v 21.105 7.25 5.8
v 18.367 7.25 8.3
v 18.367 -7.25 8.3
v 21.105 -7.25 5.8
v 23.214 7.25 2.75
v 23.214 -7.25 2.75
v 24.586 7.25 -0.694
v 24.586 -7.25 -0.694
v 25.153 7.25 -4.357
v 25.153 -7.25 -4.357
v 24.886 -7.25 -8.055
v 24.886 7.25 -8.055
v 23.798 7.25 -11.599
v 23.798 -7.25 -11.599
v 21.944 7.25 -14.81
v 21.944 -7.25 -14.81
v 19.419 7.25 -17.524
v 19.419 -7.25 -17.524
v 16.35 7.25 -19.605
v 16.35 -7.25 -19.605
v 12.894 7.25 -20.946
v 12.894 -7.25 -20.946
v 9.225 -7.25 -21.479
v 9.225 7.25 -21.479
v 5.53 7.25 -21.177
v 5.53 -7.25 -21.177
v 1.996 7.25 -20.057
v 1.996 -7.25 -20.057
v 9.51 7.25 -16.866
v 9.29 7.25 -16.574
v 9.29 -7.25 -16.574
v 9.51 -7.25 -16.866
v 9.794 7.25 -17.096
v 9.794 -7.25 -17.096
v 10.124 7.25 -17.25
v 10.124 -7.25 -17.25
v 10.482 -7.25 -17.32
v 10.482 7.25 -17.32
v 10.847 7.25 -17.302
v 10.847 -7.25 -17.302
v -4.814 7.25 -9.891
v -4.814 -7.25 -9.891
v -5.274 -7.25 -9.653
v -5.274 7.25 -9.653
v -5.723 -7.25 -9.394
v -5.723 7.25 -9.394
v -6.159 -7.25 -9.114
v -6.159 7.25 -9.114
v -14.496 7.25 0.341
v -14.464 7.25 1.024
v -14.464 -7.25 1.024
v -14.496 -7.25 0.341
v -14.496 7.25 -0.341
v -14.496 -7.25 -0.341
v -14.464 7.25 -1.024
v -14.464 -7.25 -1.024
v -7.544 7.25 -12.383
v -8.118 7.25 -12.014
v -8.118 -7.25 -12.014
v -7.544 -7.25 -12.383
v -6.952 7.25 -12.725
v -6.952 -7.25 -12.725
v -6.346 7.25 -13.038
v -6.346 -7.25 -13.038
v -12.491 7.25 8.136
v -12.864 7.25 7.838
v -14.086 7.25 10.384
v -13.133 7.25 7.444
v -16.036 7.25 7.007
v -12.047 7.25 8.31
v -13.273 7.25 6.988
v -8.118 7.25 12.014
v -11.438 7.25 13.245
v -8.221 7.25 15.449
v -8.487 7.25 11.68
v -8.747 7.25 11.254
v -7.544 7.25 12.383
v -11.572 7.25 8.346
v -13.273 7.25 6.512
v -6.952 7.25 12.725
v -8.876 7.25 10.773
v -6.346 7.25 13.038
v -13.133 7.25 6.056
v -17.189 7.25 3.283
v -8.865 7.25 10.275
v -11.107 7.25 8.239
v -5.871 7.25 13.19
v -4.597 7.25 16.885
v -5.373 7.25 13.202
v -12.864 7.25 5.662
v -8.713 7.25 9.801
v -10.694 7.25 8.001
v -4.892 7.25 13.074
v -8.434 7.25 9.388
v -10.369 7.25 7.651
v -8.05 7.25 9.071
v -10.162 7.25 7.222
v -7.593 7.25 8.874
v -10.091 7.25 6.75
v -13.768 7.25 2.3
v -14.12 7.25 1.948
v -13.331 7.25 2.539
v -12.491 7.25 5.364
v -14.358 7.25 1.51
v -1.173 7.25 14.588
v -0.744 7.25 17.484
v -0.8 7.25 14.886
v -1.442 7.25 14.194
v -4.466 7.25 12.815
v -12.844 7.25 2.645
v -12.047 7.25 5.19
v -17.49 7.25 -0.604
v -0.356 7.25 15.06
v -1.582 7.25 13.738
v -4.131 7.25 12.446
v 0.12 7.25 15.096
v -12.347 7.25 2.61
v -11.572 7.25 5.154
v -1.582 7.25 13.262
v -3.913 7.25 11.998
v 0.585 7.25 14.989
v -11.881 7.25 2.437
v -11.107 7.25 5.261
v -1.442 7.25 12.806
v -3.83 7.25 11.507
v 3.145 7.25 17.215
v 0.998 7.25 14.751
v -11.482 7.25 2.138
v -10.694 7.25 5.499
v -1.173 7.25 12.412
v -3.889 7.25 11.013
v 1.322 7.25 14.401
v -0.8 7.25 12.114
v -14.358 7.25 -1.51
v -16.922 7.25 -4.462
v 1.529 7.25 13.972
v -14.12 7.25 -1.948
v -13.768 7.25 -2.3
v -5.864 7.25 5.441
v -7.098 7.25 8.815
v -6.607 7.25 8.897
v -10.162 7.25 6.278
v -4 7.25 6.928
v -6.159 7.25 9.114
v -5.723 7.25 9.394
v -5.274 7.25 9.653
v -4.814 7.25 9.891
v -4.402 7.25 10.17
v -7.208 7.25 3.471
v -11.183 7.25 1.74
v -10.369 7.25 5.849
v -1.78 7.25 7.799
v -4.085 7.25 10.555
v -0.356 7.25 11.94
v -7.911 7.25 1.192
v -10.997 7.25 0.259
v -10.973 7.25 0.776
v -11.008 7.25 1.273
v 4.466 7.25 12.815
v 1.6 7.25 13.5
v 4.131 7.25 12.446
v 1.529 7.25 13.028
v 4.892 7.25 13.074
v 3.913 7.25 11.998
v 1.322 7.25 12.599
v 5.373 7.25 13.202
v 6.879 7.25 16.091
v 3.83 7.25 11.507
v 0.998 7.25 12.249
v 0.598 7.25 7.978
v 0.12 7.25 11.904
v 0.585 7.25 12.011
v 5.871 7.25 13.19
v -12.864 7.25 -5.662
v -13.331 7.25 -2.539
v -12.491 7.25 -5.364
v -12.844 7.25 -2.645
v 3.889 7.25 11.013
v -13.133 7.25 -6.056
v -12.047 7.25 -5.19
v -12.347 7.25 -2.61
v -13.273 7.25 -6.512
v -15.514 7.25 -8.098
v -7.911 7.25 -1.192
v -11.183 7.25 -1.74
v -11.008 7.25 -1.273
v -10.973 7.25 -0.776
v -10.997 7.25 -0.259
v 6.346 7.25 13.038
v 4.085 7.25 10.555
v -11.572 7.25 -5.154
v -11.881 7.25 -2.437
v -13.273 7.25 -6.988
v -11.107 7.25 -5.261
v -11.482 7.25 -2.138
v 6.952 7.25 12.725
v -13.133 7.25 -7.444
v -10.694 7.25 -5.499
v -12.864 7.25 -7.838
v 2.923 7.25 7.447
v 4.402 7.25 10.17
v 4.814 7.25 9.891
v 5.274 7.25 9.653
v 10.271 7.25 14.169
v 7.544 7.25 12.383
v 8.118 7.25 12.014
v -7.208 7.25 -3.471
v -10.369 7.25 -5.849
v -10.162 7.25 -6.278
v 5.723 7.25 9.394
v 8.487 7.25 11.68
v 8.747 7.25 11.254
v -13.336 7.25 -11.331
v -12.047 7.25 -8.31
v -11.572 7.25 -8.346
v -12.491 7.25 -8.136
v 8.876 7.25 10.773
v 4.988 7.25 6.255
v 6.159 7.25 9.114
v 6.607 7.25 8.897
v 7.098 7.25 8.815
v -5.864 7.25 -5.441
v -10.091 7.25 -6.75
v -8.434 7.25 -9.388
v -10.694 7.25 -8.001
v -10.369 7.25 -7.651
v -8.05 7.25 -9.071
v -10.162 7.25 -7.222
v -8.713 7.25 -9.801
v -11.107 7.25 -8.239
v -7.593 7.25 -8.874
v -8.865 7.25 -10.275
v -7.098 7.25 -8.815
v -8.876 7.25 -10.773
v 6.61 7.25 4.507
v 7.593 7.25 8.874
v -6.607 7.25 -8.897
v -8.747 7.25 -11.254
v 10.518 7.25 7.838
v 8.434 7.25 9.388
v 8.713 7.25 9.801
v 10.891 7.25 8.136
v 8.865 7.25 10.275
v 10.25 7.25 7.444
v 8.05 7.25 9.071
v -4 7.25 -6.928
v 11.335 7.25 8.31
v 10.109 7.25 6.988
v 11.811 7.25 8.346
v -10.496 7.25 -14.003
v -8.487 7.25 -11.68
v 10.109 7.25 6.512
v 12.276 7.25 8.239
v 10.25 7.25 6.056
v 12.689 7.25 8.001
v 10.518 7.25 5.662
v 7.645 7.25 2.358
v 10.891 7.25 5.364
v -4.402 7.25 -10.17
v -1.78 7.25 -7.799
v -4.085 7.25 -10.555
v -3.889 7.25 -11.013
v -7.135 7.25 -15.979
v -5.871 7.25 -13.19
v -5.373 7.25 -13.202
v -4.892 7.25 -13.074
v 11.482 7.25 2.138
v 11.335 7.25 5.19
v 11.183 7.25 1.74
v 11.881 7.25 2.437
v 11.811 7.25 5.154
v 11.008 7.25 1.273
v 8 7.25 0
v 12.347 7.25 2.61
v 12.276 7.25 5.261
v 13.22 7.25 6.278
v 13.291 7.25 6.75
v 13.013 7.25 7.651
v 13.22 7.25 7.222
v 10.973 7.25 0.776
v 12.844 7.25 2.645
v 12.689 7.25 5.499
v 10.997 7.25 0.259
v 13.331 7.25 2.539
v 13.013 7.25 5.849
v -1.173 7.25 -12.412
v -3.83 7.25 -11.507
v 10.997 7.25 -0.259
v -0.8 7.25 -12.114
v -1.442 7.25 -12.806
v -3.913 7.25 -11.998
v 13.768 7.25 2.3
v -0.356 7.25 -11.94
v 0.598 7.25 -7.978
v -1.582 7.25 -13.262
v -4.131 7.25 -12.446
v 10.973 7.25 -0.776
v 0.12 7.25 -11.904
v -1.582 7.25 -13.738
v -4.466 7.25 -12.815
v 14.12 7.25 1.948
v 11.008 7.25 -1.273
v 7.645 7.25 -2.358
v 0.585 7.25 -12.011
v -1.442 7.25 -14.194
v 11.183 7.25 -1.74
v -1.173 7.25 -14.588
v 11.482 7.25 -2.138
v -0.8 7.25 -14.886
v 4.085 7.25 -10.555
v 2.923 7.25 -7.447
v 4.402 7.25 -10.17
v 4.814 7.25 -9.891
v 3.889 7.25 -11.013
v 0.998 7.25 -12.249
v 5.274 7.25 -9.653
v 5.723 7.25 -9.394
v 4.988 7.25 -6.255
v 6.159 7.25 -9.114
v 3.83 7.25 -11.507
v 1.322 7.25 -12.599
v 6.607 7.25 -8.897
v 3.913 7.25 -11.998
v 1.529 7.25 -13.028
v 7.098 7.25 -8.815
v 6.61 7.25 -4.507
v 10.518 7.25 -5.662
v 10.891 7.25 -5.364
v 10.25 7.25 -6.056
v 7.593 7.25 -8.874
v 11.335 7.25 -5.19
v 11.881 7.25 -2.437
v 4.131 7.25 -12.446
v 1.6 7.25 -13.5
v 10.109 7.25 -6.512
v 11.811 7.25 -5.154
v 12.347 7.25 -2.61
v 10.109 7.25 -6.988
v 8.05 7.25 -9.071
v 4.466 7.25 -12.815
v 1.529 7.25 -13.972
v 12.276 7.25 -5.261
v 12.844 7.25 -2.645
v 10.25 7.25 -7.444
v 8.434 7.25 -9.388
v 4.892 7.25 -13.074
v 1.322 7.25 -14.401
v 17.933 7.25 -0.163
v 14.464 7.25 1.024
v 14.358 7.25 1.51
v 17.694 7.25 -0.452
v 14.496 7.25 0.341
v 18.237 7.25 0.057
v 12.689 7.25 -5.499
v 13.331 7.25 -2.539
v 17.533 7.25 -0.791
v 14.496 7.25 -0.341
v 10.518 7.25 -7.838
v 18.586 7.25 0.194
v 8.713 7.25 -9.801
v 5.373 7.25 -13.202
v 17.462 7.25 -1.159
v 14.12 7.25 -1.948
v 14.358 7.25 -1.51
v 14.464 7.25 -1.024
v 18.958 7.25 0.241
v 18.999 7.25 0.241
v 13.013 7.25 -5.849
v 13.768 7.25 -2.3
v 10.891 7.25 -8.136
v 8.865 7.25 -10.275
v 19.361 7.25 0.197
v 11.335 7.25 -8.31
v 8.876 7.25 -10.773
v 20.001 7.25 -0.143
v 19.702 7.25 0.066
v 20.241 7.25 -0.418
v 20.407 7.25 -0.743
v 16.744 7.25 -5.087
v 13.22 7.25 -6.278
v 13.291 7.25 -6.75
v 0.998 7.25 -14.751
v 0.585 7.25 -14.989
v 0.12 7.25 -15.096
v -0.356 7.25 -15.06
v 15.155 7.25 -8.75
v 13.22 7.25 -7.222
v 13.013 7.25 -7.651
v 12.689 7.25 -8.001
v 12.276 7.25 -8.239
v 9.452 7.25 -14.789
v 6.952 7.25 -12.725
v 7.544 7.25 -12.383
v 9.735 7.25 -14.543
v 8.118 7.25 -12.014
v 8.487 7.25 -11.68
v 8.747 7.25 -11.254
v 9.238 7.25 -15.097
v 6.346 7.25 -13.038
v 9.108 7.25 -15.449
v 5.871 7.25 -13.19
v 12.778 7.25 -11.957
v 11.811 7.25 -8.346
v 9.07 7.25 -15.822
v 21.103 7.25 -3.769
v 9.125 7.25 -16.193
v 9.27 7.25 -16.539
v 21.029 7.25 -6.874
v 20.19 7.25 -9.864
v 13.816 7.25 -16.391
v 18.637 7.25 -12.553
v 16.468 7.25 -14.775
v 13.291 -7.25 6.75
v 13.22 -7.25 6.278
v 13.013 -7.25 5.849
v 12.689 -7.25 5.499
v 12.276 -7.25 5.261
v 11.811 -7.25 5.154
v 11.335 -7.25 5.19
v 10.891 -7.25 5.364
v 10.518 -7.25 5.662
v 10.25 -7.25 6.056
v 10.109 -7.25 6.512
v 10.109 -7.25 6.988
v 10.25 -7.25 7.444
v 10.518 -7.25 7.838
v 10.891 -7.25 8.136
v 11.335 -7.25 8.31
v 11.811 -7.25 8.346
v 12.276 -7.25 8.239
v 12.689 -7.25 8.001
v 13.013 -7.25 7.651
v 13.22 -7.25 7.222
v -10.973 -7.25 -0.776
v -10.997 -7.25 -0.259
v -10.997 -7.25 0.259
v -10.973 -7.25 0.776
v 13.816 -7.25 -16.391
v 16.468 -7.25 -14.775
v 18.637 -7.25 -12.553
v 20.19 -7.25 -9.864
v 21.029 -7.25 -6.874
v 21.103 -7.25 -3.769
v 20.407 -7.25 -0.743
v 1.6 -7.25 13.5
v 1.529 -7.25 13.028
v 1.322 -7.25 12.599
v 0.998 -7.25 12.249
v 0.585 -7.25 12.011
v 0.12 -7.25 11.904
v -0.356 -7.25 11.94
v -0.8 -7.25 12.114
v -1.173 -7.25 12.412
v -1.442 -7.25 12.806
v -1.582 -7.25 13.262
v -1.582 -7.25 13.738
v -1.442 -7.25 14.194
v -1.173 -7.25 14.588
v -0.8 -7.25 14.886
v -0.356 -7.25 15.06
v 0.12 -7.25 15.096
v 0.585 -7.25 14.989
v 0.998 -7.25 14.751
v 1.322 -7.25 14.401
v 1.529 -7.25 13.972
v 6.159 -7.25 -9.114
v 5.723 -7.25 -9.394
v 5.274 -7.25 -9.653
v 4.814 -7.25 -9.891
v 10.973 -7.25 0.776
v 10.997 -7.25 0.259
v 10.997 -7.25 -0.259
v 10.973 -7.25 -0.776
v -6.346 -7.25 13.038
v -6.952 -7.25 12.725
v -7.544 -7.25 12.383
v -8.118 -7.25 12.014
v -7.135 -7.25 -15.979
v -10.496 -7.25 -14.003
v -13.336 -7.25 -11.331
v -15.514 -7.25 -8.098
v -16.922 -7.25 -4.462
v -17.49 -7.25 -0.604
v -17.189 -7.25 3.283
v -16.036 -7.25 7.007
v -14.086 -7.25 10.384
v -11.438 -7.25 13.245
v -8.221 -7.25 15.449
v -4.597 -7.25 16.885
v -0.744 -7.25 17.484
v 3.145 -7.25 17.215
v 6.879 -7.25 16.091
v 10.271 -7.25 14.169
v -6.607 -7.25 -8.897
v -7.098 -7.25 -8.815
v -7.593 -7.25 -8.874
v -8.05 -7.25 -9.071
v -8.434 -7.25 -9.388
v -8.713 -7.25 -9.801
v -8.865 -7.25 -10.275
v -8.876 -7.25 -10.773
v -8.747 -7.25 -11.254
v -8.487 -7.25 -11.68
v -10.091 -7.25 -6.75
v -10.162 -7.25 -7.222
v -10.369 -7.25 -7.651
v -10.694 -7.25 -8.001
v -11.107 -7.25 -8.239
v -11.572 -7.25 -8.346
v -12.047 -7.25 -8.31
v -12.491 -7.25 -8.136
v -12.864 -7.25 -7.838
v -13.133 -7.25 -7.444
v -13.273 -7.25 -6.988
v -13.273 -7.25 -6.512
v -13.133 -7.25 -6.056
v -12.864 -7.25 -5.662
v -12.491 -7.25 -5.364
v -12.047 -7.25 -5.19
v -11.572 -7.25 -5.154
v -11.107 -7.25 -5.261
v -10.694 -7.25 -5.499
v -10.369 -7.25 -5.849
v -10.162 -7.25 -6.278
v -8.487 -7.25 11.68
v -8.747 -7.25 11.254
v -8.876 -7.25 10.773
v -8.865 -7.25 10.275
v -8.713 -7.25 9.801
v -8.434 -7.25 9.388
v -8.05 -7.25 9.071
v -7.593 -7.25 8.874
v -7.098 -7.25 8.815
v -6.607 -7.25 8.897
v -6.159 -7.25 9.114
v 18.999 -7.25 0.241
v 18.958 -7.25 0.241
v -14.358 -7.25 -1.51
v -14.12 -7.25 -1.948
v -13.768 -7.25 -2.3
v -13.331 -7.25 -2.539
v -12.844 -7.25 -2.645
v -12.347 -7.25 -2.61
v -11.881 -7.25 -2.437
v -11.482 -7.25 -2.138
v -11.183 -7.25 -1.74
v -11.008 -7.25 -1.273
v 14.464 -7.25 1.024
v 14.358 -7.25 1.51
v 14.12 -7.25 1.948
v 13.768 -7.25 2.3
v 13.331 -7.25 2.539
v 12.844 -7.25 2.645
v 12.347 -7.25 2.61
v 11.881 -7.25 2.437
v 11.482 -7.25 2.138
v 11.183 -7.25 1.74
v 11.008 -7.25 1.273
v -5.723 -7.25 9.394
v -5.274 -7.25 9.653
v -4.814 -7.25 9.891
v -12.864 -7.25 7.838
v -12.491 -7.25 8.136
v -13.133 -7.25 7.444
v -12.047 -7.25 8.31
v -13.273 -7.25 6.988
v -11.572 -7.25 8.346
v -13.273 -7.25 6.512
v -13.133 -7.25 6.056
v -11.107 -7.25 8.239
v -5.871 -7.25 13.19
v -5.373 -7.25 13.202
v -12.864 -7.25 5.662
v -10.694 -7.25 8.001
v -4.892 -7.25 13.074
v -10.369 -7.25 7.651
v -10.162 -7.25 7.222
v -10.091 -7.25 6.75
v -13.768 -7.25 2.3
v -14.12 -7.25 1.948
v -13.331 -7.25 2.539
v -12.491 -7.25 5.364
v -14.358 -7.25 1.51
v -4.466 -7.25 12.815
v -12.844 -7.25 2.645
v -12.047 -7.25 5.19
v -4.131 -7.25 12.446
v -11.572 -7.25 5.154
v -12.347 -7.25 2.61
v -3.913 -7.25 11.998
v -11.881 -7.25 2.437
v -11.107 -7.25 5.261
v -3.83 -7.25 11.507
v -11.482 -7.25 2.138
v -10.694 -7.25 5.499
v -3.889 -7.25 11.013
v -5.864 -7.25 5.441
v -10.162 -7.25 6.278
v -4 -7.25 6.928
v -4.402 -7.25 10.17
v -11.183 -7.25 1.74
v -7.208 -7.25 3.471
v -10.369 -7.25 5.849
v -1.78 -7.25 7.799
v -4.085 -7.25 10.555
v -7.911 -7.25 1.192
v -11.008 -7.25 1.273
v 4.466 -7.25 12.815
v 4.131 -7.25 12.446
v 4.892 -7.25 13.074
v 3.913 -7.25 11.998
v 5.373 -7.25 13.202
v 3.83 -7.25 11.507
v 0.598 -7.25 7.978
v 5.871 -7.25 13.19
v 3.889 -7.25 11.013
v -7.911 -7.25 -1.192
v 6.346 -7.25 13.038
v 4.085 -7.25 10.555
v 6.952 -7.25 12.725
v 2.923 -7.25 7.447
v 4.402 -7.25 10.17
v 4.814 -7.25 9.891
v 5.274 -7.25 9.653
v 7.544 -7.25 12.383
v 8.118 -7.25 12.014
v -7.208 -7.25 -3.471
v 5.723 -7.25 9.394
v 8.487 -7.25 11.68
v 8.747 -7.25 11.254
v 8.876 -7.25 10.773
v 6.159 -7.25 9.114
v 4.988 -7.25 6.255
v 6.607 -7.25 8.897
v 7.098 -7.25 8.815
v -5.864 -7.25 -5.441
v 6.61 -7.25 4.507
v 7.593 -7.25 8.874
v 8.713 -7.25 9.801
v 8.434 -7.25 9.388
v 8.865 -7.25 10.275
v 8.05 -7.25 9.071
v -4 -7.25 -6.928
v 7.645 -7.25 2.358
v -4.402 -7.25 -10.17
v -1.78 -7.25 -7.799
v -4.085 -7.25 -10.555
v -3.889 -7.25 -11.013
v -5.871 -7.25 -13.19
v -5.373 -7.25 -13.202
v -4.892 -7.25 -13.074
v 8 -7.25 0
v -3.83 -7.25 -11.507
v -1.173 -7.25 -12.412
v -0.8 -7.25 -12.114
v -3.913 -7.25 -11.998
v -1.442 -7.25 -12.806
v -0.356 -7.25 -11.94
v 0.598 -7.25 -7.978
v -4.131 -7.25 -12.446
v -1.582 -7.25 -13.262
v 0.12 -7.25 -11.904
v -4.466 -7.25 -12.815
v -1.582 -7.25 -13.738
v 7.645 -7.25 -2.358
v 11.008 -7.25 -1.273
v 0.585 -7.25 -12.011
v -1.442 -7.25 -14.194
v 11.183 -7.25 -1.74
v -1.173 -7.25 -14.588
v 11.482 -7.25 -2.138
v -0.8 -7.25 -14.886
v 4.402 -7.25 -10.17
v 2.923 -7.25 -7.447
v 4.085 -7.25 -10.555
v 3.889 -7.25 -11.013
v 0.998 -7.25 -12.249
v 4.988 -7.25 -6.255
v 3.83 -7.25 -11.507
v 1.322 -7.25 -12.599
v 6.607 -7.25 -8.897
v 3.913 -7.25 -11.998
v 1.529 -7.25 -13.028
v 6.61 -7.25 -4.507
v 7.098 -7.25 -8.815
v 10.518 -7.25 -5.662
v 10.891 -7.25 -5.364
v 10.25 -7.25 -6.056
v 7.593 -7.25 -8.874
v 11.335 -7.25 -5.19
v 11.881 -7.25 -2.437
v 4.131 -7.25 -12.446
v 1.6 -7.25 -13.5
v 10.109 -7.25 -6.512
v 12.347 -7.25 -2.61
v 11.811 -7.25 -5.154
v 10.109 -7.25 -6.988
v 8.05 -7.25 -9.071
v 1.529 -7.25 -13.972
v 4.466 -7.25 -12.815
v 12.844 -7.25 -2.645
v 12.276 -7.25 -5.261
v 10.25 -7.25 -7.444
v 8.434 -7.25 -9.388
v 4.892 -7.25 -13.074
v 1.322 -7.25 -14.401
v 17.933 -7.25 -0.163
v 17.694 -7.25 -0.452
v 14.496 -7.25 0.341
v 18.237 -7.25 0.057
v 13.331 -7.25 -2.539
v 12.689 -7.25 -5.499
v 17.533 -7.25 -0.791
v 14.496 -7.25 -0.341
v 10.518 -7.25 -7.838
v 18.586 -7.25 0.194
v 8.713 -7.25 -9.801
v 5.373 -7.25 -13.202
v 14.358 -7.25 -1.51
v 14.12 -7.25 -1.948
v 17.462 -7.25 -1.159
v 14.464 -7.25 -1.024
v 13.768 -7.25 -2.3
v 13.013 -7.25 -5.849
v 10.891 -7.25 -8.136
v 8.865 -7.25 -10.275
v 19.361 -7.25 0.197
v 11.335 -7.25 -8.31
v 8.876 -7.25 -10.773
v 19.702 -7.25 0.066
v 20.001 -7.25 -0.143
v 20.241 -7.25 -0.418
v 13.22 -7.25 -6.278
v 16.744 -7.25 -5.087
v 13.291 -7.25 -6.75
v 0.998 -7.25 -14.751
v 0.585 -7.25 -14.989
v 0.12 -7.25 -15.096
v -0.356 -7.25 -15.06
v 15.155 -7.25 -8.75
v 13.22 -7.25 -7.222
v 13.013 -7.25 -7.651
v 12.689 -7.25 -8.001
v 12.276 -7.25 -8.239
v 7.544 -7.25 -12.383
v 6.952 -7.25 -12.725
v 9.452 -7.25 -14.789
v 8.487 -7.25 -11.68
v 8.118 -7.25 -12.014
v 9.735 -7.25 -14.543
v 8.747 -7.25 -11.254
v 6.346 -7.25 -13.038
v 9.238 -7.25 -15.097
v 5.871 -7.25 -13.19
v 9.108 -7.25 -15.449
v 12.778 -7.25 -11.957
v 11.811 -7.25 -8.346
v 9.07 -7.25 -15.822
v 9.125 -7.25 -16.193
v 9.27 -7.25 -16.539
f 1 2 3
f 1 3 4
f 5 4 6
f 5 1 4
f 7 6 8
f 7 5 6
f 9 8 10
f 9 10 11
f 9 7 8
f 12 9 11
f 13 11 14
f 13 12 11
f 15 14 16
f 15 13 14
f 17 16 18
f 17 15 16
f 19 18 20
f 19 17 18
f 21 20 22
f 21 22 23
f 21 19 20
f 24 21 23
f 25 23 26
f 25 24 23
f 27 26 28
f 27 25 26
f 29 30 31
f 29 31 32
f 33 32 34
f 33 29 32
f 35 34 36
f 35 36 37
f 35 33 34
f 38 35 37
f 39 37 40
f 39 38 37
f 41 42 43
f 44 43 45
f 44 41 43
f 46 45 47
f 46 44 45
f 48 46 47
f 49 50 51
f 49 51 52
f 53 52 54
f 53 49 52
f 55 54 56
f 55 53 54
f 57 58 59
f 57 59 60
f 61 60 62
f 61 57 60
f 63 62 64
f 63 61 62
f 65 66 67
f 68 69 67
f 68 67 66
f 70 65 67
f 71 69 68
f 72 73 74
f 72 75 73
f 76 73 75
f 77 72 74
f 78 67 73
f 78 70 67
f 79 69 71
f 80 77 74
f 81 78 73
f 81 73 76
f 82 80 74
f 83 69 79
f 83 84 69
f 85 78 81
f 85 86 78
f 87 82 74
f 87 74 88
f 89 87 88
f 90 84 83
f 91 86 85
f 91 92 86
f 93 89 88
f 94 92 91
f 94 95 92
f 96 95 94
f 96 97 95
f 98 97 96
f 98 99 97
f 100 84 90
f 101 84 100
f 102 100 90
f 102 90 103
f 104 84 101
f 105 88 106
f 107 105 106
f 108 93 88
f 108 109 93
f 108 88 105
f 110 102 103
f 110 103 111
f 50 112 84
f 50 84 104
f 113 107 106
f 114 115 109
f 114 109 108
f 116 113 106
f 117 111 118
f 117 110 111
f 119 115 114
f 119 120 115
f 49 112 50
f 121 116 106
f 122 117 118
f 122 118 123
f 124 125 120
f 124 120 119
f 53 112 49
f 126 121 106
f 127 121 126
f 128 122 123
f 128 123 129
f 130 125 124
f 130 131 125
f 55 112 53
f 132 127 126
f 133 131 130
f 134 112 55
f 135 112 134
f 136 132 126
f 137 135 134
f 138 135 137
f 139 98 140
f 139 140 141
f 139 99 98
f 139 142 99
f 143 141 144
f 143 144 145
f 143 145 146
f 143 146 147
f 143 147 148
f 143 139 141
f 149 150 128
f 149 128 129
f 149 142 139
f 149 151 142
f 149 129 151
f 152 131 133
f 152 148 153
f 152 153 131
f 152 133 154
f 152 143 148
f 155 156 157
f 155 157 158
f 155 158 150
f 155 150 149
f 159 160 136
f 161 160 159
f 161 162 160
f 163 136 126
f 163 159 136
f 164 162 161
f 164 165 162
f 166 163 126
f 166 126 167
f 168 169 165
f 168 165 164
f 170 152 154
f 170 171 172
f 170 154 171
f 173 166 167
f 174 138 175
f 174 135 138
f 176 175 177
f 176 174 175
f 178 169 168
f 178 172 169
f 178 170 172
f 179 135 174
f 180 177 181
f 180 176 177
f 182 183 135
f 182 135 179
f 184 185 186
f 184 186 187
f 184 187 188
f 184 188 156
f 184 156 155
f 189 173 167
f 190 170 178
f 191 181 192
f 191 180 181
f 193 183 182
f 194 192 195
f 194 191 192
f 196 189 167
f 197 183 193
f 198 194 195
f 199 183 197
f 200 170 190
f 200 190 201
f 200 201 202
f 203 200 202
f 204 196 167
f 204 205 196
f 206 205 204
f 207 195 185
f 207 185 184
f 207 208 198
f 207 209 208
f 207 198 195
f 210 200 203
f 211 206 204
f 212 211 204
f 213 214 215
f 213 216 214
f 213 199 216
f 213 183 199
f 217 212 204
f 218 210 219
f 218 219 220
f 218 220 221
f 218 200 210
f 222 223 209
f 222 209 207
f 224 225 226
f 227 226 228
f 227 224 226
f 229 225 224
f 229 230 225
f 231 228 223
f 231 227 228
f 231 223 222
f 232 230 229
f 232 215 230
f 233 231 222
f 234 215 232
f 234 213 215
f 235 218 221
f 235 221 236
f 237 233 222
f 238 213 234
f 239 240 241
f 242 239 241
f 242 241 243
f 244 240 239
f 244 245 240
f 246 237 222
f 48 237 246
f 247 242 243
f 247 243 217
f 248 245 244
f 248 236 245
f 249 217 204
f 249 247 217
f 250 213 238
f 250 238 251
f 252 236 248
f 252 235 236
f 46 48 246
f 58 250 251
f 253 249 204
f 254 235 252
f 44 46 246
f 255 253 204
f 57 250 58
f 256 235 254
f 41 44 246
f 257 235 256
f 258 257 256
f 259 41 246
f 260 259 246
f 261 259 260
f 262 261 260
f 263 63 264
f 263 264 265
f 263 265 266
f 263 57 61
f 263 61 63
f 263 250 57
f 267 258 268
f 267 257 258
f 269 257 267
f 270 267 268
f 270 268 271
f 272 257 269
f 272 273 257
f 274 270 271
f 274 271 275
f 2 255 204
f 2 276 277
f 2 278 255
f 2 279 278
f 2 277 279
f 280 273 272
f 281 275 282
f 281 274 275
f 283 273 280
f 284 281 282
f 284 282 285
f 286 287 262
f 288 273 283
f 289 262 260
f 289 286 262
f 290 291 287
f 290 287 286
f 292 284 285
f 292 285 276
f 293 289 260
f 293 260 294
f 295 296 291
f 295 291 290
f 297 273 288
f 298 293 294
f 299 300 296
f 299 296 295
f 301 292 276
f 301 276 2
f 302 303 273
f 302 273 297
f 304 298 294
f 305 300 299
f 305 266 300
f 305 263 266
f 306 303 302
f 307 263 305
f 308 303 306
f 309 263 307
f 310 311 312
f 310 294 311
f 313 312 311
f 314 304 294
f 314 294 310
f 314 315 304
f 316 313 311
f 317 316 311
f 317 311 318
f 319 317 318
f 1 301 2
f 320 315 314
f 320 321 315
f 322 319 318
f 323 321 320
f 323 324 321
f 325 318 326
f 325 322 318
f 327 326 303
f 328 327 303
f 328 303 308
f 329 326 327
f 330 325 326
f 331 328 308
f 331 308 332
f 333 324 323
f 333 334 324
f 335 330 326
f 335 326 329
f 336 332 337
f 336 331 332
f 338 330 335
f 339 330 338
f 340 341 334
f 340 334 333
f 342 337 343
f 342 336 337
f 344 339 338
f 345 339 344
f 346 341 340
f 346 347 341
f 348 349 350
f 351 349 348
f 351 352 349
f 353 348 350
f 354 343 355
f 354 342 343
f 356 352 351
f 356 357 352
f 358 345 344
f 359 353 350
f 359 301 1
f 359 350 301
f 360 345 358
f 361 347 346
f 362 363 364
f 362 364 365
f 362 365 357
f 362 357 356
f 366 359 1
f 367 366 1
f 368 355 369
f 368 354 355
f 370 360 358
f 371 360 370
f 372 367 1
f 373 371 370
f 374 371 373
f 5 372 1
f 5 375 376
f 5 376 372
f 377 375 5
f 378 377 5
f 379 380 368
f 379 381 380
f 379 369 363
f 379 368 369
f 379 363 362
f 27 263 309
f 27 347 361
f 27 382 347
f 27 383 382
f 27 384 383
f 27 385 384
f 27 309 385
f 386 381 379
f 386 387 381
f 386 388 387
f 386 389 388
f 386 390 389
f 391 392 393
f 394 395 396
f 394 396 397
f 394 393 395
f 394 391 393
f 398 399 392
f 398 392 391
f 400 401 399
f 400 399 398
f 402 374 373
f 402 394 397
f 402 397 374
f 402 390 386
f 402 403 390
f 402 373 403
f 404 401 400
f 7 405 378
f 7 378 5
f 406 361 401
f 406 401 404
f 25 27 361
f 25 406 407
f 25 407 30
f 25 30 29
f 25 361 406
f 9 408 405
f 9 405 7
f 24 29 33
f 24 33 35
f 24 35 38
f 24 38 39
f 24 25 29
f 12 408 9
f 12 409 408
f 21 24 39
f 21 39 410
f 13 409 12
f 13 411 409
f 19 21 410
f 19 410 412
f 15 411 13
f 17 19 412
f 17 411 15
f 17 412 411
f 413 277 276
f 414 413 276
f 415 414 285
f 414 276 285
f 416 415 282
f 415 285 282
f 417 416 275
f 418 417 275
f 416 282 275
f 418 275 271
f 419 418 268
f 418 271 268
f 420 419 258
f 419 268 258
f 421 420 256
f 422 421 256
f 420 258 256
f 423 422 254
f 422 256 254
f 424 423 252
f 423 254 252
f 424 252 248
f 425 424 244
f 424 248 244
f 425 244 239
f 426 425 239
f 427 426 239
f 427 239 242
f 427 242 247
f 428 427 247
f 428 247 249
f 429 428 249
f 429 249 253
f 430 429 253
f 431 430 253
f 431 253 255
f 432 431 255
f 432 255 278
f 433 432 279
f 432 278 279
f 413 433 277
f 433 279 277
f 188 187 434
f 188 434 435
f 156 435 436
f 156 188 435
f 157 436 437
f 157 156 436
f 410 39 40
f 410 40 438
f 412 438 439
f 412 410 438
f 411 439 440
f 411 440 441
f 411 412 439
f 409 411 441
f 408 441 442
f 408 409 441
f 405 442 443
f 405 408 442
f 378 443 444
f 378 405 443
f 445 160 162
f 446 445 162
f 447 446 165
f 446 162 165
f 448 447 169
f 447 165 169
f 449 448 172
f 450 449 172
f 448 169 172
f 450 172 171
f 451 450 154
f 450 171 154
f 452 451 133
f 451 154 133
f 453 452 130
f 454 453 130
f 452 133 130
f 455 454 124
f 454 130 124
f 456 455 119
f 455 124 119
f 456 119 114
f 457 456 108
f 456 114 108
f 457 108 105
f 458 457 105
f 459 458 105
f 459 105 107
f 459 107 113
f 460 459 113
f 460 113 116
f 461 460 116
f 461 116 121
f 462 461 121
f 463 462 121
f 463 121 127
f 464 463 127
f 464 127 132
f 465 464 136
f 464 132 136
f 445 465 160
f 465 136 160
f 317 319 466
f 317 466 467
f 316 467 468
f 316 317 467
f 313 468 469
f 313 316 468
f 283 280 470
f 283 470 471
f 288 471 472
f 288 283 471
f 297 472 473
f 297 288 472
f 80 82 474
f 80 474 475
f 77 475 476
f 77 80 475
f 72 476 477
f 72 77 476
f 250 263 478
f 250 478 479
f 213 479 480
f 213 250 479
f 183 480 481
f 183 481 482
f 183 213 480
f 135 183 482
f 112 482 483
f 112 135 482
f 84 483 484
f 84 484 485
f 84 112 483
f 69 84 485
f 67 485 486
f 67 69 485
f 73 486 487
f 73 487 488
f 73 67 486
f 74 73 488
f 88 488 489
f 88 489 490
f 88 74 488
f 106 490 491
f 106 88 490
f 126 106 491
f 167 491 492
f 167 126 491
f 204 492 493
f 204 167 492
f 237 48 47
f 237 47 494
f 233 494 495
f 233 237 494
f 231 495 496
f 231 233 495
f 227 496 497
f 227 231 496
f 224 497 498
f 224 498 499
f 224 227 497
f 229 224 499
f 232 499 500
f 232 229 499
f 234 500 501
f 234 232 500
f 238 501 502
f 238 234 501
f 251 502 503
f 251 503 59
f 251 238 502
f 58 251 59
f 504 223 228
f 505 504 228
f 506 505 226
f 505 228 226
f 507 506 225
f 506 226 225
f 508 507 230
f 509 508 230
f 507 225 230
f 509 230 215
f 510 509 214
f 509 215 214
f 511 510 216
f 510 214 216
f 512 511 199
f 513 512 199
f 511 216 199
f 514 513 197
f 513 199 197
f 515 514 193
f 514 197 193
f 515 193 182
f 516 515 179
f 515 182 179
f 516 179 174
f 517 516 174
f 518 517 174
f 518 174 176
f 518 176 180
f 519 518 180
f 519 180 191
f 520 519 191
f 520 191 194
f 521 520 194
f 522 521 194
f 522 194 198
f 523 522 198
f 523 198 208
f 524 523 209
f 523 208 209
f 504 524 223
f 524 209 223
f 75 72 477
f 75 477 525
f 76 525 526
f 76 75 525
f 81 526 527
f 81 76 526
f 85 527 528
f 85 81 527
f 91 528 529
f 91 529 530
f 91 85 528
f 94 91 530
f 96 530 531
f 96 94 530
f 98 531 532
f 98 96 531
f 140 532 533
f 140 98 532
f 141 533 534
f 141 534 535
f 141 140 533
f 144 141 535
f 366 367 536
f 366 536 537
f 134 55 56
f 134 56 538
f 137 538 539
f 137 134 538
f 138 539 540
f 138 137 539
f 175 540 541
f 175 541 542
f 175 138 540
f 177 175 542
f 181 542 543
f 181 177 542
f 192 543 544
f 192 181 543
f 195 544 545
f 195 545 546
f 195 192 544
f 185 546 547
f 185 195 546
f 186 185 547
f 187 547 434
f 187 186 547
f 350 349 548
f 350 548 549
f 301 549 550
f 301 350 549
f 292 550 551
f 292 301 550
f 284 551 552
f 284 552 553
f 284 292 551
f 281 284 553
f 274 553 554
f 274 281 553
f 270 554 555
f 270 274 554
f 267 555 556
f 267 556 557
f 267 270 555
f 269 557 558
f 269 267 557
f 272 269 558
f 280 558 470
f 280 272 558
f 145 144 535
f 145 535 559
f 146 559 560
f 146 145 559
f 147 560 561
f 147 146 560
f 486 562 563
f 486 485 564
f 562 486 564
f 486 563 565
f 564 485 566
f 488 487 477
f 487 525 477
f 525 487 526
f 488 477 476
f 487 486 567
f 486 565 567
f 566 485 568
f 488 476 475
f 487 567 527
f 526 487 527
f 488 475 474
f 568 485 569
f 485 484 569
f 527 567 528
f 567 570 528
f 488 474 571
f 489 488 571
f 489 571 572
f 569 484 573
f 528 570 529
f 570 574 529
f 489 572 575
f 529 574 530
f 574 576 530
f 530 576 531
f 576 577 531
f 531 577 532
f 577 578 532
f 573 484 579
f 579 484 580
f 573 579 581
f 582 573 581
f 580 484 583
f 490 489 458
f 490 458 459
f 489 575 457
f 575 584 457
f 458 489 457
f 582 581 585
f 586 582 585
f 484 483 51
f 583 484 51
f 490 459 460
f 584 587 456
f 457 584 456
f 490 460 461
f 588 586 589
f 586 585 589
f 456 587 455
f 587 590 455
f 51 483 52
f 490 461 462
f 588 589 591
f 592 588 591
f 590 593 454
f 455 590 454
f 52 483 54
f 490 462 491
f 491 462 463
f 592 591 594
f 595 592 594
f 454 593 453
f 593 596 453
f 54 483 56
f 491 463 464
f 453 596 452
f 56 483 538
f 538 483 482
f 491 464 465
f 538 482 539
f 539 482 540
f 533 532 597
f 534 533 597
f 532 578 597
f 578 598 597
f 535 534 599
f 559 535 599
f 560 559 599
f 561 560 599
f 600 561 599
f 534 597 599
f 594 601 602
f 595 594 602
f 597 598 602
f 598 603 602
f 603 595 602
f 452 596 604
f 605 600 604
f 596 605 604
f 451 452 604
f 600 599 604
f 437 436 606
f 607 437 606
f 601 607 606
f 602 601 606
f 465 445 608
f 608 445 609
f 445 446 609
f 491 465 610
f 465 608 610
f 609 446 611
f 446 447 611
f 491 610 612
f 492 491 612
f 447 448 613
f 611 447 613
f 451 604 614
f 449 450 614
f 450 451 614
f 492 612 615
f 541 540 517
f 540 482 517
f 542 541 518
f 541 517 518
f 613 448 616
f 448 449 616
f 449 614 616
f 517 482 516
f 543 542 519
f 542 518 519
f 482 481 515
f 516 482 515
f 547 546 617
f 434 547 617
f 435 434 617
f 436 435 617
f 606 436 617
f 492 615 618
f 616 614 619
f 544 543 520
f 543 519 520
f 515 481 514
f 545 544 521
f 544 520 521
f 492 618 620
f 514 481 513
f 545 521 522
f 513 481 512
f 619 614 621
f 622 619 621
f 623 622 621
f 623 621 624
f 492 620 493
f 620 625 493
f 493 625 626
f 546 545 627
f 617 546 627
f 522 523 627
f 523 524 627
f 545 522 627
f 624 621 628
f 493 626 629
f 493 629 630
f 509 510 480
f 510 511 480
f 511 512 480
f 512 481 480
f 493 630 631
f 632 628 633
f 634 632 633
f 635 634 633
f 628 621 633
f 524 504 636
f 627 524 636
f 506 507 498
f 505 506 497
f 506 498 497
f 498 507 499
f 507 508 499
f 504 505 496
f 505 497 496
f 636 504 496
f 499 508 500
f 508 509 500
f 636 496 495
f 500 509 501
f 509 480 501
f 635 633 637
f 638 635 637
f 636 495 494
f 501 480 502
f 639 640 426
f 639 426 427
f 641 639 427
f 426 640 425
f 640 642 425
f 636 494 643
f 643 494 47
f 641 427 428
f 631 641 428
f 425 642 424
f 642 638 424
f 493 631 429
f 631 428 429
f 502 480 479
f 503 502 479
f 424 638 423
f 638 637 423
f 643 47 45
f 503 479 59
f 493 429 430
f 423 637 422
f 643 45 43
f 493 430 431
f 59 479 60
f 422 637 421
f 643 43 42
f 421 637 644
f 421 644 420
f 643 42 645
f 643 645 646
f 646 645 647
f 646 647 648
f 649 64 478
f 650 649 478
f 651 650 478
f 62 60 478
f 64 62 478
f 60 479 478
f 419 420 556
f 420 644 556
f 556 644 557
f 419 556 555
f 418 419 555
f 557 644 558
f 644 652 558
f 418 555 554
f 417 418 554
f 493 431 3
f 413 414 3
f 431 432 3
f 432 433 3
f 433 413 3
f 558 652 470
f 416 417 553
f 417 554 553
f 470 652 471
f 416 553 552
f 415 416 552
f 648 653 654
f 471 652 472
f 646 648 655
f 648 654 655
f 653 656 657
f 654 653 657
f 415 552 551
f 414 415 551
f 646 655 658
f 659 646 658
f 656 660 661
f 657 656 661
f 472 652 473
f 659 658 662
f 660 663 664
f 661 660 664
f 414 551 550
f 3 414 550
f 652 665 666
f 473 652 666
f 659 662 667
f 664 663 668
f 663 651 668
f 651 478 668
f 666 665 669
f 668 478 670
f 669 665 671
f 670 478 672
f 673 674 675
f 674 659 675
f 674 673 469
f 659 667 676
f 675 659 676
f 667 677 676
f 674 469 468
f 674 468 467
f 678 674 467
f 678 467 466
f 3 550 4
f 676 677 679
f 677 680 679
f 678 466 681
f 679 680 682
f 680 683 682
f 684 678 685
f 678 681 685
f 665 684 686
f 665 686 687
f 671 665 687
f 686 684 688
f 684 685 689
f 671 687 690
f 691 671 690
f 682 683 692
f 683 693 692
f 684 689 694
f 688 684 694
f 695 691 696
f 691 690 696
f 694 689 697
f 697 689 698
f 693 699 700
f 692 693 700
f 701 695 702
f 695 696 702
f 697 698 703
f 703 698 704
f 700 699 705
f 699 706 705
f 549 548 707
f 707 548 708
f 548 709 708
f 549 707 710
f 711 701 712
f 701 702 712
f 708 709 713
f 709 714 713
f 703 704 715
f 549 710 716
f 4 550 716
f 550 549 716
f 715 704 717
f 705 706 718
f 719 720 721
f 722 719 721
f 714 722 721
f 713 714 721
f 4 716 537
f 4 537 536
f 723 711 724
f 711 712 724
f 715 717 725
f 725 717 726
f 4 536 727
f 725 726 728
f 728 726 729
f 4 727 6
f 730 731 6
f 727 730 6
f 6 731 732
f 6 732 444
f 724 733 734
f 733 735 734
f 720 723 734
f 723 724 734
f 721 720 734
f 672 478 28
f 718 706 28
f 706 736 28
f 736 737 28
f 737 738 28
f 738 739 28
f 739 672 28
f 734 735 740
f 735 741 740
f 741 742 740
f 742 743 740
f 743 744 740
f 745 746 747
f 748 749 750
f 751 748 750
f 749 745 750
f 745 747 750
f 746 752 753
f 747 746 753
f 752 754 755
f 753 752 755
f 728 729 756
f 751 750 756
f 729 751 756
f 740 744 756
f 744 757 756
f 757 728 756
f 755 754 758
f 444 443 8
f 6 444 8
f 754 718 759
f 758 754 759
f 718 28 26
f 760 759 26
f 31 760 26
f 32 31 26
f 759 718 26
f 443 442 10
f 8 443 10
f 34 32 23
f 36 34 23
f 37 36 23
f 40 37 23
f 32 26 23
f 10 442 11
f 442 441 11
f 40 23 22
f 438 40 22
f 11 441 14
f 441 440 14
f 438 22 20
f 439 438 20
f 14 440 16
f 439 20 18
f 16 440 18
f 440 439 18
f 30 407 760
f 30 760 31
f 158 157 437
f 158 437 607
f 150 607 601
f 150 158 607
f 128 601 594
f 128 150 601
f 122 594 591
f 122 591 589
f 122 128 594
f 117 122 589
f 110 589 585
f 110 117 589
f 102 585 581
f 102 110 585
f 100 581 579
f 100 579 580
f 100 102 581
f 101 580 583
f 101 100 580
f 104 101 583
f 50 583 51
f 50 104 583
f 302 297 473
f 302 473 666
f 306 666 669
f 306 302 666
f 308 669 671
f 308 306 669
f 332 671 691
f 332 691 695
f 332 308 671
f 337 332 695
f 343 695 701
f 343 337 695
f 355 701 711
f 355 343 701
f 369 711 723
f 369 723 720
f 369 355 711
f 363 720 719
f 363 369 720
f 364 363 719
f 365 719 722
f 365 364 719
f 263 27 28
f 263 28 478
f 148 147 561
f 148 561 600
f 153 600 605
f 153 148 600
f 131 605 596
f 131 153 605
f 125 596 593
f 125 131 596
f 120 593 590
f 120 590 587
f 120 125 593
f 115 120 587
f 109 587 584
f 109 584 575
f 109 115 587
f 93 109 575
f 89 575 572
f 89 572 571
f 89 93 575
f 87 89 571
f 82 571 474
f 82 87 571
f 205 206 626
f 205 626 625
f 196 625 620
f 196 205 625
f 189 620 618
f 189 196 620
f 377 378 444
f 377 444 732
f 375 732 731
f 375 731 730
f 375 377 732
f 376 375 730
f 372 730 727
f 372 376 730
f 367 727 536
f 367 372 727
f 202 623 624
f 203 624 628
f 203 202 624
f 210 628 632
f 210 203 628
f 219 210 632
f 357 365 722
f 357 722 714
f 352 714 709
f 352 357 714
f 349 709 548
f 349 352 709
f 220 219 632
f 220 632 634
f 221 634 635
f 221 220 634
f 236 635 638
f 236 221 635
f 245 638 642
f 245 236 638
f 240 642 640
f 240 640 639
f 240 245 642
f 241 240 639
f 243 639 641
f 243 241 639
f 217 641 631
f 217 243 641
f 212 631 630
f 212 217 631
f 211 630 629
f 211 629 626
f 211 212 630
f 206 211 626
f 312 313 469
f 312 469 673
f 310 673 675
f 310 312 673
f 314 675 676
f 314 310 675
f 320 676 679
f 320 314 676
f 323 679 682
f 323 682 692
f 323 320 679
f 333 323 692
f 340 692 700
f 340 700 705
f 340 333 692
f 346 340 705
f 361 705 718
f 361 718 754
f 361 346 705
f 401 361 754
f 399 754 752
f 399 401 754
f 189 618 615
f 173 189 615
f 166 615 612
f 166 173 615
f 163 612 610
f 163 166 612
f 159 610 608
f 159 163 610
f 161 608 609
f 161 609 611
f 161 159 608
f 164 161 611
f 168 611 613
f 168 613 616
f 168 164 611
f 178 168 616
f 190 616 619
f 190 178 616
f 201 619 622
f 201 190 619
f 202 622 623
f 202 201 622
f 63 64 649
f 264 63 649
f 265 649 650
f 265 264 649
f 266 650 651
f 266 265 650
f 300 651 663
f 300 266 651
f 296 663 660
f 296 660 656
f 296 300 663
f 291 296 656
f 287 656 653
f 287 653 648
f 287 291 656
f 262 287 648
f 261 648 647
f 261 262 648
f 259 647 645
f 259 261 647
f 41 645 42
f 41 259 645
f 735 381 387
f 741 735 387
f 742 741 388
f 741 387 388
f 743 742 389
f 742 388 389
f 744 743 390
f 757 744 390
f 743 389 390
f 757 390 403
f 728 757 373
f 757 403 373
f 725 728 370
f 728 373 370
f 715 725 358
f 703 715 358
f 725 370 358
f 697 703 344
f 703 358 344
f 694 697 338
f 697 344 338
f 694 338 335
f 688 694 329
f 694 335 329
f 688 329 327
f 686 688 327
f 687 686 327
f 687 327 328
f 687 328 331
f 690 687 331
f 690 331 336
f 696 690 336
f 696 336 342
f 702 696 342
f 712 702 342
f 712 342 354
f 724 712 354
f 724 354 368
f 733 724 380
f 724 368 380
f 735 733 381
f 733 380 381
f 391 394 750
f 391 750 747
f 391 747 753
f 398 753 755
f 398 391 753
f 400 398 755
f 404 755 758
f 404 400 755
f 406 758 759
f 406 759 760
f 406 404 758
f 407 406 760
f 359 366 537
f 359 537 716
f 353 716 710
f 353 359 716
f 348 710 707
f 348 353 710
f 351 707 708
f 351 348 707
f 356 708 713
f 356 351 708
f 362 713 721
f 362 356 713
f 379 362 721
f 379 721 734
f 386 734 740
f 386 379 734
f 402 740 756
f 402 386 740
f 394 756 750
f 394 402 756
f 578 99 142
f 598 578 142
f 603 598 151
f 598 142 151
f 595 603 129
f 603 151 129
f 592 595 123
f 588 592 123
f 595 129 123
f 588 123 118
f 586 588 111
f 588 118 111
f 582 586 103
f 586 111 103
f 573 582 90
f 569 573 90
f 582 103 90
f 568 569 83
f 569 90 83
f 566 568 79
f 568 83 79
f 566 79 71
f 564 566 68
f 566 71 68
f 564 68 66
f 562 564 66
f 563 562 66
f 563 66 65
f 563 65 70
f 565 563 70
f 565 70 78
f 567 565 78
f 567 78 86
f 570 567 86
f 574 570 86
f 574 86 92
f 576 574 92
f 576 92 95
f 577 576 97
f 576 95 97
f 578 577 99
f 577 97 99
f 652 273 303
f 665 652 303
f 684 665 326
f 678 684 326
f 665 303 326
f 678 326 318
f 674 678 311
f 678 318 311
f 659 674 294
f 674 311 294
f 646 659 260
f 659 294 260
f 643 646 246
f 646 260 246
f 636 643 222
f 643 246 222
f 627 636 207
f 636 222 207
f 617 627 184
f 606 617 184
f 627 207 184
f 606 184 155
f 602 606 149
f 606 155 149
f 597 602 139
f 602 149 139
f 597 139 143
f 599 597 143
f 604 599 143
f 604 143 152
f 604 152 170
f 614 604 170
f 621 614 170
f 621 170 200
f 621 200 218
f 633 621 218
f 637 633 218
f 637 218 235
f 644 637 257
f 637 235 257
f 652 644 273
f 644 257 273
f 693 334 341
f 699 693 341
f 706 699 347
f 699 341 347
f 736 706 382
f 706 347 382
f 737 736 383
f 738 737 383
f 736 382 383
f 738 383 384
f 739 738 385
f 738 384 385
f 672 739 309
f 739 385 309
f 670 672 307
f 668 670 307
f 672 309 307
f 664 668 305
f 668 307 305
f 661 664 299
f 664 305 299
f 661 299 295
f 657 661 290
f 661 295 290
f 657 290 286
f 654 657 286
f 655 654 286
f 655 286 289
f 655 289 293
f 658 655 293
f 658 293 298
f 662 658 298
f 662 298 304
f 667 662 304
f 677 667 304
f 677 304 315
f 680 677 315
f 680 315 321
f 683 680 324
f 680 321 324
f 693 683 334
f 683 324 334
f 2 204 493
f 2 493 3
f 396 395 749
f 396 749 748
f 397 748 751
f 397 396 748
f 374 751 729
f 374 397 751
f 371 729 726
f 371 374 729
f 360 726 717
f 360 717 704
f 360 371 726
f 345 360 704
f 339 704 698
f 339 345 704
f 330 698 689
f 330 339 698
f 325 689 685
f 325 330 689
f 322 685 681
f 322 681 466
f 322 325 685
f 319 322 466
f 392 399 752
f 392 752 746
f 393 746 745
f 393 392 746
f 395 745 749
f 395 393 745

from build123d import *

# Parameters (mm, degrees)
SKETCH_1_R      = 1.6
SKETCH_1_R_2    = 8
EXTRUDE_1_DEPTH = 14.5


with BuildPart() as part:
    # 草图1 → 凸台-拉伸1 (new body)
    with BuildSketch(Plane(origin=(0, 7.25, 0), x_dir=(1, 0, 0), z_dir=(0, 1, 0))):
        with BuildLine():
            Line((10.270859413, -14.168960686), (18.367408376, -8.299898164))
            ThreePointArc((18.367408376, -8.299898164), (22.961692064, 13.256939094), (1.995781529, 20.056591338))
            Line((1.995781529, 20.056591338), (-7.135250193, 15.979305513))
            ThreePointArc((-7.135250193, 15.979305513), (-15.155444566, -8.75), (10.270859413, -14.168960686))
        make_face()
        with Locations((-11.691342951, -6.75)):
            Circle(SKETCH_1_R, mode=Mode.SUBTRACT)
        with Locations((-11.691342951, 6.75)):
            Circle(SKETCH_1_R, mode=Mode.SUBTRACT)
        with Locations((0, 13.5)):
            Circle(SKETCH_1_R, mode=Mode.SUBTRACT)
        with Locations((11.691342951, 6.75)):
            Circle(SKETCH_1_R, mode=Mode.SUBTRACT)
        with Locations((11.691342951, -6.75)):
            Circle(SKETCH_1_R, mode=Mode.SUBTRACT)
        with Locations((0, -13.5)):
            Circle(SKETCH_1_R, mode=Mode.SUBTRACT)
        Circle(SKETCH_1_R_2, mode=Mode.SUBTRACT)
        with BuildLine():
            Line((18.998716884, -0.241336031), (18.958263766, -0.241336031))
            ThreePointArc((18.958263766, -0.241336031), (17.933337503, 0.163435155), (17.461558732, 1.159295761))
            ThreePointArc((17.461558732, 1.159295761), (15.155444566, 8.75), (9.734758946, 14.542505571))
            ThreePointArc((9.734758946, 14.542505571), (9.108207748, 15.449008275), (9.27012875, 16.539006048))
            Line((9.27012875, 16.539006048), (9.290355309, 16.574039476))
            ThreePointArc((9.290355309, 16.574039476), (9.954159898, 17.182891337), (10.847026058, 17.301748995))
            ThreePointArc((10.847026058, 17.301748995), (19.497590449, 11.256939094), (20.407267188, 0.742925624))
            ThreePointArc((20.407267188, 0.742925624), (19.857900358, 0.029109677), (18.998716884, -0.241336031))
        make_face(mode=Mode.SUBTRACT)
        with BuildLine():
            ThreePointArc((4.813837212, -9.890751807), (5.5, -9.526279442), (6.158723721, -9.114281218))
            ThreePointArc((6.158723721, -9.114281218), (8.588519962, -9.584483547), (8.118317632, -12.014279788))
            ThreePointArc((8.118317632, -12.014279788), (7.25, -12.557368355), (6.345512688, -13.0378092))
            ThreePointArc((6.345512688, -13.0378092), (4.006146253, -12.230118241), (4.813837212, -9.890751807))
        make_face(mode=Mode.SUBTRACT)
        with BuildLine():
            ThreePointArc((-6.158723721, -9.114281218), (-5.5, -9.526279442), (-4.813837212, -9.890751807))
            ThreePointArc((-4.813837212, -9.890751807), (-4.006146253, -12.230118241), (-6.345512688, -13.0378092))
            ThreePointArc((-6.345512688, -13.0378092), (-7.25, -12.557368355), (-8.118317632, -12.014279788))
            ThreePointArc((-8.118317632, -12.014279788), (-8.588519962, -9.584483547), (-6.158723721, -9.114281218))
        make_face(mode=Mode.SUBTRACT)
        with BuildLine():
            ThreePointArc((-10.972560933, 0.776470588), (-11, 0), (-10.972560933, -0.776470588))
            ThreePointArc((-10.972560933, -0.776470588), (-12.594666215, -2.645634694), (-14.463830321, -1.023529412))
            ThreePointArc((-14.463830321, -1.023529412), (-14.5, 0), (-14.463830321, 1.023529412))
            ThreePointArc((-14.463830321, 1.023529412), (-12.594666215, 2.645634694), (-10.972560933, 0.776470588))
        make_face(mode=Mode.SUBTRACT)
        with BuildLine():
            ThreePointArc((-4.813837212, 9.890751807), (-5.5, 9.526279442), (-6.158723721, 9.114281218))
            ThreePointArc((-6.158723721, 9.114281218), (-8.588519962, 9.584483547), (-8.118317632, 12.014279788))
            ThreePointArc((-8.118317632, 12.014279788), (-7.25, 12.557368355), (-6.345512688, 13.0378092))
            ThreePointArc((-6.345512688, 13.0378092), (-4.006146253, 12.230118241), (-4.813837212, 9.890751807))
        make_face(mode=Mode.SUBTRACT)
        with BuildLine():
            ThreePointArc((6.158723721, 9.114281218), (5.5, 9.526279442), (4.813837212, 9.890751807))
            ThreePointArc((4.813837212, 9.890751807), (4.006146253, 12.230118241), (6.345512688, 13.0378092))
            ThreePointArc((6.345512688, 13.0378092), (7.25, 12.557368355), (8.118317632, 12.014279788))
            ThreePointArc((8.118317632, 12.014279788), (8.588519962, 9.584483547), (6.158723721, 9.114281218))
        make_face(mode=Mode.SUBTRACT)
        with BuildLine():
            ThreePointArc((10.972560933, -0.776470588), (11, 0), (10.972560933, 0.776470588))
            ThreePointArc((10.972560933, 0.776470588), (12.594666215, 2.645634694), (14.463830321, 1.023529412))
            ThreePointArc((14.463830321, 1.023529412), (14.5, 0), (14.463830321, -1.023529412))
            ThreePointArc((14.463830321, -1.023529412), (12.594666215, -2.645634694), (10.972560933, -0.776470588))
        make_face(mode=Mode.SUBTRACT)
    extrude(amount=-EXTRUDE_1_DEPTH)


solid = part.part
